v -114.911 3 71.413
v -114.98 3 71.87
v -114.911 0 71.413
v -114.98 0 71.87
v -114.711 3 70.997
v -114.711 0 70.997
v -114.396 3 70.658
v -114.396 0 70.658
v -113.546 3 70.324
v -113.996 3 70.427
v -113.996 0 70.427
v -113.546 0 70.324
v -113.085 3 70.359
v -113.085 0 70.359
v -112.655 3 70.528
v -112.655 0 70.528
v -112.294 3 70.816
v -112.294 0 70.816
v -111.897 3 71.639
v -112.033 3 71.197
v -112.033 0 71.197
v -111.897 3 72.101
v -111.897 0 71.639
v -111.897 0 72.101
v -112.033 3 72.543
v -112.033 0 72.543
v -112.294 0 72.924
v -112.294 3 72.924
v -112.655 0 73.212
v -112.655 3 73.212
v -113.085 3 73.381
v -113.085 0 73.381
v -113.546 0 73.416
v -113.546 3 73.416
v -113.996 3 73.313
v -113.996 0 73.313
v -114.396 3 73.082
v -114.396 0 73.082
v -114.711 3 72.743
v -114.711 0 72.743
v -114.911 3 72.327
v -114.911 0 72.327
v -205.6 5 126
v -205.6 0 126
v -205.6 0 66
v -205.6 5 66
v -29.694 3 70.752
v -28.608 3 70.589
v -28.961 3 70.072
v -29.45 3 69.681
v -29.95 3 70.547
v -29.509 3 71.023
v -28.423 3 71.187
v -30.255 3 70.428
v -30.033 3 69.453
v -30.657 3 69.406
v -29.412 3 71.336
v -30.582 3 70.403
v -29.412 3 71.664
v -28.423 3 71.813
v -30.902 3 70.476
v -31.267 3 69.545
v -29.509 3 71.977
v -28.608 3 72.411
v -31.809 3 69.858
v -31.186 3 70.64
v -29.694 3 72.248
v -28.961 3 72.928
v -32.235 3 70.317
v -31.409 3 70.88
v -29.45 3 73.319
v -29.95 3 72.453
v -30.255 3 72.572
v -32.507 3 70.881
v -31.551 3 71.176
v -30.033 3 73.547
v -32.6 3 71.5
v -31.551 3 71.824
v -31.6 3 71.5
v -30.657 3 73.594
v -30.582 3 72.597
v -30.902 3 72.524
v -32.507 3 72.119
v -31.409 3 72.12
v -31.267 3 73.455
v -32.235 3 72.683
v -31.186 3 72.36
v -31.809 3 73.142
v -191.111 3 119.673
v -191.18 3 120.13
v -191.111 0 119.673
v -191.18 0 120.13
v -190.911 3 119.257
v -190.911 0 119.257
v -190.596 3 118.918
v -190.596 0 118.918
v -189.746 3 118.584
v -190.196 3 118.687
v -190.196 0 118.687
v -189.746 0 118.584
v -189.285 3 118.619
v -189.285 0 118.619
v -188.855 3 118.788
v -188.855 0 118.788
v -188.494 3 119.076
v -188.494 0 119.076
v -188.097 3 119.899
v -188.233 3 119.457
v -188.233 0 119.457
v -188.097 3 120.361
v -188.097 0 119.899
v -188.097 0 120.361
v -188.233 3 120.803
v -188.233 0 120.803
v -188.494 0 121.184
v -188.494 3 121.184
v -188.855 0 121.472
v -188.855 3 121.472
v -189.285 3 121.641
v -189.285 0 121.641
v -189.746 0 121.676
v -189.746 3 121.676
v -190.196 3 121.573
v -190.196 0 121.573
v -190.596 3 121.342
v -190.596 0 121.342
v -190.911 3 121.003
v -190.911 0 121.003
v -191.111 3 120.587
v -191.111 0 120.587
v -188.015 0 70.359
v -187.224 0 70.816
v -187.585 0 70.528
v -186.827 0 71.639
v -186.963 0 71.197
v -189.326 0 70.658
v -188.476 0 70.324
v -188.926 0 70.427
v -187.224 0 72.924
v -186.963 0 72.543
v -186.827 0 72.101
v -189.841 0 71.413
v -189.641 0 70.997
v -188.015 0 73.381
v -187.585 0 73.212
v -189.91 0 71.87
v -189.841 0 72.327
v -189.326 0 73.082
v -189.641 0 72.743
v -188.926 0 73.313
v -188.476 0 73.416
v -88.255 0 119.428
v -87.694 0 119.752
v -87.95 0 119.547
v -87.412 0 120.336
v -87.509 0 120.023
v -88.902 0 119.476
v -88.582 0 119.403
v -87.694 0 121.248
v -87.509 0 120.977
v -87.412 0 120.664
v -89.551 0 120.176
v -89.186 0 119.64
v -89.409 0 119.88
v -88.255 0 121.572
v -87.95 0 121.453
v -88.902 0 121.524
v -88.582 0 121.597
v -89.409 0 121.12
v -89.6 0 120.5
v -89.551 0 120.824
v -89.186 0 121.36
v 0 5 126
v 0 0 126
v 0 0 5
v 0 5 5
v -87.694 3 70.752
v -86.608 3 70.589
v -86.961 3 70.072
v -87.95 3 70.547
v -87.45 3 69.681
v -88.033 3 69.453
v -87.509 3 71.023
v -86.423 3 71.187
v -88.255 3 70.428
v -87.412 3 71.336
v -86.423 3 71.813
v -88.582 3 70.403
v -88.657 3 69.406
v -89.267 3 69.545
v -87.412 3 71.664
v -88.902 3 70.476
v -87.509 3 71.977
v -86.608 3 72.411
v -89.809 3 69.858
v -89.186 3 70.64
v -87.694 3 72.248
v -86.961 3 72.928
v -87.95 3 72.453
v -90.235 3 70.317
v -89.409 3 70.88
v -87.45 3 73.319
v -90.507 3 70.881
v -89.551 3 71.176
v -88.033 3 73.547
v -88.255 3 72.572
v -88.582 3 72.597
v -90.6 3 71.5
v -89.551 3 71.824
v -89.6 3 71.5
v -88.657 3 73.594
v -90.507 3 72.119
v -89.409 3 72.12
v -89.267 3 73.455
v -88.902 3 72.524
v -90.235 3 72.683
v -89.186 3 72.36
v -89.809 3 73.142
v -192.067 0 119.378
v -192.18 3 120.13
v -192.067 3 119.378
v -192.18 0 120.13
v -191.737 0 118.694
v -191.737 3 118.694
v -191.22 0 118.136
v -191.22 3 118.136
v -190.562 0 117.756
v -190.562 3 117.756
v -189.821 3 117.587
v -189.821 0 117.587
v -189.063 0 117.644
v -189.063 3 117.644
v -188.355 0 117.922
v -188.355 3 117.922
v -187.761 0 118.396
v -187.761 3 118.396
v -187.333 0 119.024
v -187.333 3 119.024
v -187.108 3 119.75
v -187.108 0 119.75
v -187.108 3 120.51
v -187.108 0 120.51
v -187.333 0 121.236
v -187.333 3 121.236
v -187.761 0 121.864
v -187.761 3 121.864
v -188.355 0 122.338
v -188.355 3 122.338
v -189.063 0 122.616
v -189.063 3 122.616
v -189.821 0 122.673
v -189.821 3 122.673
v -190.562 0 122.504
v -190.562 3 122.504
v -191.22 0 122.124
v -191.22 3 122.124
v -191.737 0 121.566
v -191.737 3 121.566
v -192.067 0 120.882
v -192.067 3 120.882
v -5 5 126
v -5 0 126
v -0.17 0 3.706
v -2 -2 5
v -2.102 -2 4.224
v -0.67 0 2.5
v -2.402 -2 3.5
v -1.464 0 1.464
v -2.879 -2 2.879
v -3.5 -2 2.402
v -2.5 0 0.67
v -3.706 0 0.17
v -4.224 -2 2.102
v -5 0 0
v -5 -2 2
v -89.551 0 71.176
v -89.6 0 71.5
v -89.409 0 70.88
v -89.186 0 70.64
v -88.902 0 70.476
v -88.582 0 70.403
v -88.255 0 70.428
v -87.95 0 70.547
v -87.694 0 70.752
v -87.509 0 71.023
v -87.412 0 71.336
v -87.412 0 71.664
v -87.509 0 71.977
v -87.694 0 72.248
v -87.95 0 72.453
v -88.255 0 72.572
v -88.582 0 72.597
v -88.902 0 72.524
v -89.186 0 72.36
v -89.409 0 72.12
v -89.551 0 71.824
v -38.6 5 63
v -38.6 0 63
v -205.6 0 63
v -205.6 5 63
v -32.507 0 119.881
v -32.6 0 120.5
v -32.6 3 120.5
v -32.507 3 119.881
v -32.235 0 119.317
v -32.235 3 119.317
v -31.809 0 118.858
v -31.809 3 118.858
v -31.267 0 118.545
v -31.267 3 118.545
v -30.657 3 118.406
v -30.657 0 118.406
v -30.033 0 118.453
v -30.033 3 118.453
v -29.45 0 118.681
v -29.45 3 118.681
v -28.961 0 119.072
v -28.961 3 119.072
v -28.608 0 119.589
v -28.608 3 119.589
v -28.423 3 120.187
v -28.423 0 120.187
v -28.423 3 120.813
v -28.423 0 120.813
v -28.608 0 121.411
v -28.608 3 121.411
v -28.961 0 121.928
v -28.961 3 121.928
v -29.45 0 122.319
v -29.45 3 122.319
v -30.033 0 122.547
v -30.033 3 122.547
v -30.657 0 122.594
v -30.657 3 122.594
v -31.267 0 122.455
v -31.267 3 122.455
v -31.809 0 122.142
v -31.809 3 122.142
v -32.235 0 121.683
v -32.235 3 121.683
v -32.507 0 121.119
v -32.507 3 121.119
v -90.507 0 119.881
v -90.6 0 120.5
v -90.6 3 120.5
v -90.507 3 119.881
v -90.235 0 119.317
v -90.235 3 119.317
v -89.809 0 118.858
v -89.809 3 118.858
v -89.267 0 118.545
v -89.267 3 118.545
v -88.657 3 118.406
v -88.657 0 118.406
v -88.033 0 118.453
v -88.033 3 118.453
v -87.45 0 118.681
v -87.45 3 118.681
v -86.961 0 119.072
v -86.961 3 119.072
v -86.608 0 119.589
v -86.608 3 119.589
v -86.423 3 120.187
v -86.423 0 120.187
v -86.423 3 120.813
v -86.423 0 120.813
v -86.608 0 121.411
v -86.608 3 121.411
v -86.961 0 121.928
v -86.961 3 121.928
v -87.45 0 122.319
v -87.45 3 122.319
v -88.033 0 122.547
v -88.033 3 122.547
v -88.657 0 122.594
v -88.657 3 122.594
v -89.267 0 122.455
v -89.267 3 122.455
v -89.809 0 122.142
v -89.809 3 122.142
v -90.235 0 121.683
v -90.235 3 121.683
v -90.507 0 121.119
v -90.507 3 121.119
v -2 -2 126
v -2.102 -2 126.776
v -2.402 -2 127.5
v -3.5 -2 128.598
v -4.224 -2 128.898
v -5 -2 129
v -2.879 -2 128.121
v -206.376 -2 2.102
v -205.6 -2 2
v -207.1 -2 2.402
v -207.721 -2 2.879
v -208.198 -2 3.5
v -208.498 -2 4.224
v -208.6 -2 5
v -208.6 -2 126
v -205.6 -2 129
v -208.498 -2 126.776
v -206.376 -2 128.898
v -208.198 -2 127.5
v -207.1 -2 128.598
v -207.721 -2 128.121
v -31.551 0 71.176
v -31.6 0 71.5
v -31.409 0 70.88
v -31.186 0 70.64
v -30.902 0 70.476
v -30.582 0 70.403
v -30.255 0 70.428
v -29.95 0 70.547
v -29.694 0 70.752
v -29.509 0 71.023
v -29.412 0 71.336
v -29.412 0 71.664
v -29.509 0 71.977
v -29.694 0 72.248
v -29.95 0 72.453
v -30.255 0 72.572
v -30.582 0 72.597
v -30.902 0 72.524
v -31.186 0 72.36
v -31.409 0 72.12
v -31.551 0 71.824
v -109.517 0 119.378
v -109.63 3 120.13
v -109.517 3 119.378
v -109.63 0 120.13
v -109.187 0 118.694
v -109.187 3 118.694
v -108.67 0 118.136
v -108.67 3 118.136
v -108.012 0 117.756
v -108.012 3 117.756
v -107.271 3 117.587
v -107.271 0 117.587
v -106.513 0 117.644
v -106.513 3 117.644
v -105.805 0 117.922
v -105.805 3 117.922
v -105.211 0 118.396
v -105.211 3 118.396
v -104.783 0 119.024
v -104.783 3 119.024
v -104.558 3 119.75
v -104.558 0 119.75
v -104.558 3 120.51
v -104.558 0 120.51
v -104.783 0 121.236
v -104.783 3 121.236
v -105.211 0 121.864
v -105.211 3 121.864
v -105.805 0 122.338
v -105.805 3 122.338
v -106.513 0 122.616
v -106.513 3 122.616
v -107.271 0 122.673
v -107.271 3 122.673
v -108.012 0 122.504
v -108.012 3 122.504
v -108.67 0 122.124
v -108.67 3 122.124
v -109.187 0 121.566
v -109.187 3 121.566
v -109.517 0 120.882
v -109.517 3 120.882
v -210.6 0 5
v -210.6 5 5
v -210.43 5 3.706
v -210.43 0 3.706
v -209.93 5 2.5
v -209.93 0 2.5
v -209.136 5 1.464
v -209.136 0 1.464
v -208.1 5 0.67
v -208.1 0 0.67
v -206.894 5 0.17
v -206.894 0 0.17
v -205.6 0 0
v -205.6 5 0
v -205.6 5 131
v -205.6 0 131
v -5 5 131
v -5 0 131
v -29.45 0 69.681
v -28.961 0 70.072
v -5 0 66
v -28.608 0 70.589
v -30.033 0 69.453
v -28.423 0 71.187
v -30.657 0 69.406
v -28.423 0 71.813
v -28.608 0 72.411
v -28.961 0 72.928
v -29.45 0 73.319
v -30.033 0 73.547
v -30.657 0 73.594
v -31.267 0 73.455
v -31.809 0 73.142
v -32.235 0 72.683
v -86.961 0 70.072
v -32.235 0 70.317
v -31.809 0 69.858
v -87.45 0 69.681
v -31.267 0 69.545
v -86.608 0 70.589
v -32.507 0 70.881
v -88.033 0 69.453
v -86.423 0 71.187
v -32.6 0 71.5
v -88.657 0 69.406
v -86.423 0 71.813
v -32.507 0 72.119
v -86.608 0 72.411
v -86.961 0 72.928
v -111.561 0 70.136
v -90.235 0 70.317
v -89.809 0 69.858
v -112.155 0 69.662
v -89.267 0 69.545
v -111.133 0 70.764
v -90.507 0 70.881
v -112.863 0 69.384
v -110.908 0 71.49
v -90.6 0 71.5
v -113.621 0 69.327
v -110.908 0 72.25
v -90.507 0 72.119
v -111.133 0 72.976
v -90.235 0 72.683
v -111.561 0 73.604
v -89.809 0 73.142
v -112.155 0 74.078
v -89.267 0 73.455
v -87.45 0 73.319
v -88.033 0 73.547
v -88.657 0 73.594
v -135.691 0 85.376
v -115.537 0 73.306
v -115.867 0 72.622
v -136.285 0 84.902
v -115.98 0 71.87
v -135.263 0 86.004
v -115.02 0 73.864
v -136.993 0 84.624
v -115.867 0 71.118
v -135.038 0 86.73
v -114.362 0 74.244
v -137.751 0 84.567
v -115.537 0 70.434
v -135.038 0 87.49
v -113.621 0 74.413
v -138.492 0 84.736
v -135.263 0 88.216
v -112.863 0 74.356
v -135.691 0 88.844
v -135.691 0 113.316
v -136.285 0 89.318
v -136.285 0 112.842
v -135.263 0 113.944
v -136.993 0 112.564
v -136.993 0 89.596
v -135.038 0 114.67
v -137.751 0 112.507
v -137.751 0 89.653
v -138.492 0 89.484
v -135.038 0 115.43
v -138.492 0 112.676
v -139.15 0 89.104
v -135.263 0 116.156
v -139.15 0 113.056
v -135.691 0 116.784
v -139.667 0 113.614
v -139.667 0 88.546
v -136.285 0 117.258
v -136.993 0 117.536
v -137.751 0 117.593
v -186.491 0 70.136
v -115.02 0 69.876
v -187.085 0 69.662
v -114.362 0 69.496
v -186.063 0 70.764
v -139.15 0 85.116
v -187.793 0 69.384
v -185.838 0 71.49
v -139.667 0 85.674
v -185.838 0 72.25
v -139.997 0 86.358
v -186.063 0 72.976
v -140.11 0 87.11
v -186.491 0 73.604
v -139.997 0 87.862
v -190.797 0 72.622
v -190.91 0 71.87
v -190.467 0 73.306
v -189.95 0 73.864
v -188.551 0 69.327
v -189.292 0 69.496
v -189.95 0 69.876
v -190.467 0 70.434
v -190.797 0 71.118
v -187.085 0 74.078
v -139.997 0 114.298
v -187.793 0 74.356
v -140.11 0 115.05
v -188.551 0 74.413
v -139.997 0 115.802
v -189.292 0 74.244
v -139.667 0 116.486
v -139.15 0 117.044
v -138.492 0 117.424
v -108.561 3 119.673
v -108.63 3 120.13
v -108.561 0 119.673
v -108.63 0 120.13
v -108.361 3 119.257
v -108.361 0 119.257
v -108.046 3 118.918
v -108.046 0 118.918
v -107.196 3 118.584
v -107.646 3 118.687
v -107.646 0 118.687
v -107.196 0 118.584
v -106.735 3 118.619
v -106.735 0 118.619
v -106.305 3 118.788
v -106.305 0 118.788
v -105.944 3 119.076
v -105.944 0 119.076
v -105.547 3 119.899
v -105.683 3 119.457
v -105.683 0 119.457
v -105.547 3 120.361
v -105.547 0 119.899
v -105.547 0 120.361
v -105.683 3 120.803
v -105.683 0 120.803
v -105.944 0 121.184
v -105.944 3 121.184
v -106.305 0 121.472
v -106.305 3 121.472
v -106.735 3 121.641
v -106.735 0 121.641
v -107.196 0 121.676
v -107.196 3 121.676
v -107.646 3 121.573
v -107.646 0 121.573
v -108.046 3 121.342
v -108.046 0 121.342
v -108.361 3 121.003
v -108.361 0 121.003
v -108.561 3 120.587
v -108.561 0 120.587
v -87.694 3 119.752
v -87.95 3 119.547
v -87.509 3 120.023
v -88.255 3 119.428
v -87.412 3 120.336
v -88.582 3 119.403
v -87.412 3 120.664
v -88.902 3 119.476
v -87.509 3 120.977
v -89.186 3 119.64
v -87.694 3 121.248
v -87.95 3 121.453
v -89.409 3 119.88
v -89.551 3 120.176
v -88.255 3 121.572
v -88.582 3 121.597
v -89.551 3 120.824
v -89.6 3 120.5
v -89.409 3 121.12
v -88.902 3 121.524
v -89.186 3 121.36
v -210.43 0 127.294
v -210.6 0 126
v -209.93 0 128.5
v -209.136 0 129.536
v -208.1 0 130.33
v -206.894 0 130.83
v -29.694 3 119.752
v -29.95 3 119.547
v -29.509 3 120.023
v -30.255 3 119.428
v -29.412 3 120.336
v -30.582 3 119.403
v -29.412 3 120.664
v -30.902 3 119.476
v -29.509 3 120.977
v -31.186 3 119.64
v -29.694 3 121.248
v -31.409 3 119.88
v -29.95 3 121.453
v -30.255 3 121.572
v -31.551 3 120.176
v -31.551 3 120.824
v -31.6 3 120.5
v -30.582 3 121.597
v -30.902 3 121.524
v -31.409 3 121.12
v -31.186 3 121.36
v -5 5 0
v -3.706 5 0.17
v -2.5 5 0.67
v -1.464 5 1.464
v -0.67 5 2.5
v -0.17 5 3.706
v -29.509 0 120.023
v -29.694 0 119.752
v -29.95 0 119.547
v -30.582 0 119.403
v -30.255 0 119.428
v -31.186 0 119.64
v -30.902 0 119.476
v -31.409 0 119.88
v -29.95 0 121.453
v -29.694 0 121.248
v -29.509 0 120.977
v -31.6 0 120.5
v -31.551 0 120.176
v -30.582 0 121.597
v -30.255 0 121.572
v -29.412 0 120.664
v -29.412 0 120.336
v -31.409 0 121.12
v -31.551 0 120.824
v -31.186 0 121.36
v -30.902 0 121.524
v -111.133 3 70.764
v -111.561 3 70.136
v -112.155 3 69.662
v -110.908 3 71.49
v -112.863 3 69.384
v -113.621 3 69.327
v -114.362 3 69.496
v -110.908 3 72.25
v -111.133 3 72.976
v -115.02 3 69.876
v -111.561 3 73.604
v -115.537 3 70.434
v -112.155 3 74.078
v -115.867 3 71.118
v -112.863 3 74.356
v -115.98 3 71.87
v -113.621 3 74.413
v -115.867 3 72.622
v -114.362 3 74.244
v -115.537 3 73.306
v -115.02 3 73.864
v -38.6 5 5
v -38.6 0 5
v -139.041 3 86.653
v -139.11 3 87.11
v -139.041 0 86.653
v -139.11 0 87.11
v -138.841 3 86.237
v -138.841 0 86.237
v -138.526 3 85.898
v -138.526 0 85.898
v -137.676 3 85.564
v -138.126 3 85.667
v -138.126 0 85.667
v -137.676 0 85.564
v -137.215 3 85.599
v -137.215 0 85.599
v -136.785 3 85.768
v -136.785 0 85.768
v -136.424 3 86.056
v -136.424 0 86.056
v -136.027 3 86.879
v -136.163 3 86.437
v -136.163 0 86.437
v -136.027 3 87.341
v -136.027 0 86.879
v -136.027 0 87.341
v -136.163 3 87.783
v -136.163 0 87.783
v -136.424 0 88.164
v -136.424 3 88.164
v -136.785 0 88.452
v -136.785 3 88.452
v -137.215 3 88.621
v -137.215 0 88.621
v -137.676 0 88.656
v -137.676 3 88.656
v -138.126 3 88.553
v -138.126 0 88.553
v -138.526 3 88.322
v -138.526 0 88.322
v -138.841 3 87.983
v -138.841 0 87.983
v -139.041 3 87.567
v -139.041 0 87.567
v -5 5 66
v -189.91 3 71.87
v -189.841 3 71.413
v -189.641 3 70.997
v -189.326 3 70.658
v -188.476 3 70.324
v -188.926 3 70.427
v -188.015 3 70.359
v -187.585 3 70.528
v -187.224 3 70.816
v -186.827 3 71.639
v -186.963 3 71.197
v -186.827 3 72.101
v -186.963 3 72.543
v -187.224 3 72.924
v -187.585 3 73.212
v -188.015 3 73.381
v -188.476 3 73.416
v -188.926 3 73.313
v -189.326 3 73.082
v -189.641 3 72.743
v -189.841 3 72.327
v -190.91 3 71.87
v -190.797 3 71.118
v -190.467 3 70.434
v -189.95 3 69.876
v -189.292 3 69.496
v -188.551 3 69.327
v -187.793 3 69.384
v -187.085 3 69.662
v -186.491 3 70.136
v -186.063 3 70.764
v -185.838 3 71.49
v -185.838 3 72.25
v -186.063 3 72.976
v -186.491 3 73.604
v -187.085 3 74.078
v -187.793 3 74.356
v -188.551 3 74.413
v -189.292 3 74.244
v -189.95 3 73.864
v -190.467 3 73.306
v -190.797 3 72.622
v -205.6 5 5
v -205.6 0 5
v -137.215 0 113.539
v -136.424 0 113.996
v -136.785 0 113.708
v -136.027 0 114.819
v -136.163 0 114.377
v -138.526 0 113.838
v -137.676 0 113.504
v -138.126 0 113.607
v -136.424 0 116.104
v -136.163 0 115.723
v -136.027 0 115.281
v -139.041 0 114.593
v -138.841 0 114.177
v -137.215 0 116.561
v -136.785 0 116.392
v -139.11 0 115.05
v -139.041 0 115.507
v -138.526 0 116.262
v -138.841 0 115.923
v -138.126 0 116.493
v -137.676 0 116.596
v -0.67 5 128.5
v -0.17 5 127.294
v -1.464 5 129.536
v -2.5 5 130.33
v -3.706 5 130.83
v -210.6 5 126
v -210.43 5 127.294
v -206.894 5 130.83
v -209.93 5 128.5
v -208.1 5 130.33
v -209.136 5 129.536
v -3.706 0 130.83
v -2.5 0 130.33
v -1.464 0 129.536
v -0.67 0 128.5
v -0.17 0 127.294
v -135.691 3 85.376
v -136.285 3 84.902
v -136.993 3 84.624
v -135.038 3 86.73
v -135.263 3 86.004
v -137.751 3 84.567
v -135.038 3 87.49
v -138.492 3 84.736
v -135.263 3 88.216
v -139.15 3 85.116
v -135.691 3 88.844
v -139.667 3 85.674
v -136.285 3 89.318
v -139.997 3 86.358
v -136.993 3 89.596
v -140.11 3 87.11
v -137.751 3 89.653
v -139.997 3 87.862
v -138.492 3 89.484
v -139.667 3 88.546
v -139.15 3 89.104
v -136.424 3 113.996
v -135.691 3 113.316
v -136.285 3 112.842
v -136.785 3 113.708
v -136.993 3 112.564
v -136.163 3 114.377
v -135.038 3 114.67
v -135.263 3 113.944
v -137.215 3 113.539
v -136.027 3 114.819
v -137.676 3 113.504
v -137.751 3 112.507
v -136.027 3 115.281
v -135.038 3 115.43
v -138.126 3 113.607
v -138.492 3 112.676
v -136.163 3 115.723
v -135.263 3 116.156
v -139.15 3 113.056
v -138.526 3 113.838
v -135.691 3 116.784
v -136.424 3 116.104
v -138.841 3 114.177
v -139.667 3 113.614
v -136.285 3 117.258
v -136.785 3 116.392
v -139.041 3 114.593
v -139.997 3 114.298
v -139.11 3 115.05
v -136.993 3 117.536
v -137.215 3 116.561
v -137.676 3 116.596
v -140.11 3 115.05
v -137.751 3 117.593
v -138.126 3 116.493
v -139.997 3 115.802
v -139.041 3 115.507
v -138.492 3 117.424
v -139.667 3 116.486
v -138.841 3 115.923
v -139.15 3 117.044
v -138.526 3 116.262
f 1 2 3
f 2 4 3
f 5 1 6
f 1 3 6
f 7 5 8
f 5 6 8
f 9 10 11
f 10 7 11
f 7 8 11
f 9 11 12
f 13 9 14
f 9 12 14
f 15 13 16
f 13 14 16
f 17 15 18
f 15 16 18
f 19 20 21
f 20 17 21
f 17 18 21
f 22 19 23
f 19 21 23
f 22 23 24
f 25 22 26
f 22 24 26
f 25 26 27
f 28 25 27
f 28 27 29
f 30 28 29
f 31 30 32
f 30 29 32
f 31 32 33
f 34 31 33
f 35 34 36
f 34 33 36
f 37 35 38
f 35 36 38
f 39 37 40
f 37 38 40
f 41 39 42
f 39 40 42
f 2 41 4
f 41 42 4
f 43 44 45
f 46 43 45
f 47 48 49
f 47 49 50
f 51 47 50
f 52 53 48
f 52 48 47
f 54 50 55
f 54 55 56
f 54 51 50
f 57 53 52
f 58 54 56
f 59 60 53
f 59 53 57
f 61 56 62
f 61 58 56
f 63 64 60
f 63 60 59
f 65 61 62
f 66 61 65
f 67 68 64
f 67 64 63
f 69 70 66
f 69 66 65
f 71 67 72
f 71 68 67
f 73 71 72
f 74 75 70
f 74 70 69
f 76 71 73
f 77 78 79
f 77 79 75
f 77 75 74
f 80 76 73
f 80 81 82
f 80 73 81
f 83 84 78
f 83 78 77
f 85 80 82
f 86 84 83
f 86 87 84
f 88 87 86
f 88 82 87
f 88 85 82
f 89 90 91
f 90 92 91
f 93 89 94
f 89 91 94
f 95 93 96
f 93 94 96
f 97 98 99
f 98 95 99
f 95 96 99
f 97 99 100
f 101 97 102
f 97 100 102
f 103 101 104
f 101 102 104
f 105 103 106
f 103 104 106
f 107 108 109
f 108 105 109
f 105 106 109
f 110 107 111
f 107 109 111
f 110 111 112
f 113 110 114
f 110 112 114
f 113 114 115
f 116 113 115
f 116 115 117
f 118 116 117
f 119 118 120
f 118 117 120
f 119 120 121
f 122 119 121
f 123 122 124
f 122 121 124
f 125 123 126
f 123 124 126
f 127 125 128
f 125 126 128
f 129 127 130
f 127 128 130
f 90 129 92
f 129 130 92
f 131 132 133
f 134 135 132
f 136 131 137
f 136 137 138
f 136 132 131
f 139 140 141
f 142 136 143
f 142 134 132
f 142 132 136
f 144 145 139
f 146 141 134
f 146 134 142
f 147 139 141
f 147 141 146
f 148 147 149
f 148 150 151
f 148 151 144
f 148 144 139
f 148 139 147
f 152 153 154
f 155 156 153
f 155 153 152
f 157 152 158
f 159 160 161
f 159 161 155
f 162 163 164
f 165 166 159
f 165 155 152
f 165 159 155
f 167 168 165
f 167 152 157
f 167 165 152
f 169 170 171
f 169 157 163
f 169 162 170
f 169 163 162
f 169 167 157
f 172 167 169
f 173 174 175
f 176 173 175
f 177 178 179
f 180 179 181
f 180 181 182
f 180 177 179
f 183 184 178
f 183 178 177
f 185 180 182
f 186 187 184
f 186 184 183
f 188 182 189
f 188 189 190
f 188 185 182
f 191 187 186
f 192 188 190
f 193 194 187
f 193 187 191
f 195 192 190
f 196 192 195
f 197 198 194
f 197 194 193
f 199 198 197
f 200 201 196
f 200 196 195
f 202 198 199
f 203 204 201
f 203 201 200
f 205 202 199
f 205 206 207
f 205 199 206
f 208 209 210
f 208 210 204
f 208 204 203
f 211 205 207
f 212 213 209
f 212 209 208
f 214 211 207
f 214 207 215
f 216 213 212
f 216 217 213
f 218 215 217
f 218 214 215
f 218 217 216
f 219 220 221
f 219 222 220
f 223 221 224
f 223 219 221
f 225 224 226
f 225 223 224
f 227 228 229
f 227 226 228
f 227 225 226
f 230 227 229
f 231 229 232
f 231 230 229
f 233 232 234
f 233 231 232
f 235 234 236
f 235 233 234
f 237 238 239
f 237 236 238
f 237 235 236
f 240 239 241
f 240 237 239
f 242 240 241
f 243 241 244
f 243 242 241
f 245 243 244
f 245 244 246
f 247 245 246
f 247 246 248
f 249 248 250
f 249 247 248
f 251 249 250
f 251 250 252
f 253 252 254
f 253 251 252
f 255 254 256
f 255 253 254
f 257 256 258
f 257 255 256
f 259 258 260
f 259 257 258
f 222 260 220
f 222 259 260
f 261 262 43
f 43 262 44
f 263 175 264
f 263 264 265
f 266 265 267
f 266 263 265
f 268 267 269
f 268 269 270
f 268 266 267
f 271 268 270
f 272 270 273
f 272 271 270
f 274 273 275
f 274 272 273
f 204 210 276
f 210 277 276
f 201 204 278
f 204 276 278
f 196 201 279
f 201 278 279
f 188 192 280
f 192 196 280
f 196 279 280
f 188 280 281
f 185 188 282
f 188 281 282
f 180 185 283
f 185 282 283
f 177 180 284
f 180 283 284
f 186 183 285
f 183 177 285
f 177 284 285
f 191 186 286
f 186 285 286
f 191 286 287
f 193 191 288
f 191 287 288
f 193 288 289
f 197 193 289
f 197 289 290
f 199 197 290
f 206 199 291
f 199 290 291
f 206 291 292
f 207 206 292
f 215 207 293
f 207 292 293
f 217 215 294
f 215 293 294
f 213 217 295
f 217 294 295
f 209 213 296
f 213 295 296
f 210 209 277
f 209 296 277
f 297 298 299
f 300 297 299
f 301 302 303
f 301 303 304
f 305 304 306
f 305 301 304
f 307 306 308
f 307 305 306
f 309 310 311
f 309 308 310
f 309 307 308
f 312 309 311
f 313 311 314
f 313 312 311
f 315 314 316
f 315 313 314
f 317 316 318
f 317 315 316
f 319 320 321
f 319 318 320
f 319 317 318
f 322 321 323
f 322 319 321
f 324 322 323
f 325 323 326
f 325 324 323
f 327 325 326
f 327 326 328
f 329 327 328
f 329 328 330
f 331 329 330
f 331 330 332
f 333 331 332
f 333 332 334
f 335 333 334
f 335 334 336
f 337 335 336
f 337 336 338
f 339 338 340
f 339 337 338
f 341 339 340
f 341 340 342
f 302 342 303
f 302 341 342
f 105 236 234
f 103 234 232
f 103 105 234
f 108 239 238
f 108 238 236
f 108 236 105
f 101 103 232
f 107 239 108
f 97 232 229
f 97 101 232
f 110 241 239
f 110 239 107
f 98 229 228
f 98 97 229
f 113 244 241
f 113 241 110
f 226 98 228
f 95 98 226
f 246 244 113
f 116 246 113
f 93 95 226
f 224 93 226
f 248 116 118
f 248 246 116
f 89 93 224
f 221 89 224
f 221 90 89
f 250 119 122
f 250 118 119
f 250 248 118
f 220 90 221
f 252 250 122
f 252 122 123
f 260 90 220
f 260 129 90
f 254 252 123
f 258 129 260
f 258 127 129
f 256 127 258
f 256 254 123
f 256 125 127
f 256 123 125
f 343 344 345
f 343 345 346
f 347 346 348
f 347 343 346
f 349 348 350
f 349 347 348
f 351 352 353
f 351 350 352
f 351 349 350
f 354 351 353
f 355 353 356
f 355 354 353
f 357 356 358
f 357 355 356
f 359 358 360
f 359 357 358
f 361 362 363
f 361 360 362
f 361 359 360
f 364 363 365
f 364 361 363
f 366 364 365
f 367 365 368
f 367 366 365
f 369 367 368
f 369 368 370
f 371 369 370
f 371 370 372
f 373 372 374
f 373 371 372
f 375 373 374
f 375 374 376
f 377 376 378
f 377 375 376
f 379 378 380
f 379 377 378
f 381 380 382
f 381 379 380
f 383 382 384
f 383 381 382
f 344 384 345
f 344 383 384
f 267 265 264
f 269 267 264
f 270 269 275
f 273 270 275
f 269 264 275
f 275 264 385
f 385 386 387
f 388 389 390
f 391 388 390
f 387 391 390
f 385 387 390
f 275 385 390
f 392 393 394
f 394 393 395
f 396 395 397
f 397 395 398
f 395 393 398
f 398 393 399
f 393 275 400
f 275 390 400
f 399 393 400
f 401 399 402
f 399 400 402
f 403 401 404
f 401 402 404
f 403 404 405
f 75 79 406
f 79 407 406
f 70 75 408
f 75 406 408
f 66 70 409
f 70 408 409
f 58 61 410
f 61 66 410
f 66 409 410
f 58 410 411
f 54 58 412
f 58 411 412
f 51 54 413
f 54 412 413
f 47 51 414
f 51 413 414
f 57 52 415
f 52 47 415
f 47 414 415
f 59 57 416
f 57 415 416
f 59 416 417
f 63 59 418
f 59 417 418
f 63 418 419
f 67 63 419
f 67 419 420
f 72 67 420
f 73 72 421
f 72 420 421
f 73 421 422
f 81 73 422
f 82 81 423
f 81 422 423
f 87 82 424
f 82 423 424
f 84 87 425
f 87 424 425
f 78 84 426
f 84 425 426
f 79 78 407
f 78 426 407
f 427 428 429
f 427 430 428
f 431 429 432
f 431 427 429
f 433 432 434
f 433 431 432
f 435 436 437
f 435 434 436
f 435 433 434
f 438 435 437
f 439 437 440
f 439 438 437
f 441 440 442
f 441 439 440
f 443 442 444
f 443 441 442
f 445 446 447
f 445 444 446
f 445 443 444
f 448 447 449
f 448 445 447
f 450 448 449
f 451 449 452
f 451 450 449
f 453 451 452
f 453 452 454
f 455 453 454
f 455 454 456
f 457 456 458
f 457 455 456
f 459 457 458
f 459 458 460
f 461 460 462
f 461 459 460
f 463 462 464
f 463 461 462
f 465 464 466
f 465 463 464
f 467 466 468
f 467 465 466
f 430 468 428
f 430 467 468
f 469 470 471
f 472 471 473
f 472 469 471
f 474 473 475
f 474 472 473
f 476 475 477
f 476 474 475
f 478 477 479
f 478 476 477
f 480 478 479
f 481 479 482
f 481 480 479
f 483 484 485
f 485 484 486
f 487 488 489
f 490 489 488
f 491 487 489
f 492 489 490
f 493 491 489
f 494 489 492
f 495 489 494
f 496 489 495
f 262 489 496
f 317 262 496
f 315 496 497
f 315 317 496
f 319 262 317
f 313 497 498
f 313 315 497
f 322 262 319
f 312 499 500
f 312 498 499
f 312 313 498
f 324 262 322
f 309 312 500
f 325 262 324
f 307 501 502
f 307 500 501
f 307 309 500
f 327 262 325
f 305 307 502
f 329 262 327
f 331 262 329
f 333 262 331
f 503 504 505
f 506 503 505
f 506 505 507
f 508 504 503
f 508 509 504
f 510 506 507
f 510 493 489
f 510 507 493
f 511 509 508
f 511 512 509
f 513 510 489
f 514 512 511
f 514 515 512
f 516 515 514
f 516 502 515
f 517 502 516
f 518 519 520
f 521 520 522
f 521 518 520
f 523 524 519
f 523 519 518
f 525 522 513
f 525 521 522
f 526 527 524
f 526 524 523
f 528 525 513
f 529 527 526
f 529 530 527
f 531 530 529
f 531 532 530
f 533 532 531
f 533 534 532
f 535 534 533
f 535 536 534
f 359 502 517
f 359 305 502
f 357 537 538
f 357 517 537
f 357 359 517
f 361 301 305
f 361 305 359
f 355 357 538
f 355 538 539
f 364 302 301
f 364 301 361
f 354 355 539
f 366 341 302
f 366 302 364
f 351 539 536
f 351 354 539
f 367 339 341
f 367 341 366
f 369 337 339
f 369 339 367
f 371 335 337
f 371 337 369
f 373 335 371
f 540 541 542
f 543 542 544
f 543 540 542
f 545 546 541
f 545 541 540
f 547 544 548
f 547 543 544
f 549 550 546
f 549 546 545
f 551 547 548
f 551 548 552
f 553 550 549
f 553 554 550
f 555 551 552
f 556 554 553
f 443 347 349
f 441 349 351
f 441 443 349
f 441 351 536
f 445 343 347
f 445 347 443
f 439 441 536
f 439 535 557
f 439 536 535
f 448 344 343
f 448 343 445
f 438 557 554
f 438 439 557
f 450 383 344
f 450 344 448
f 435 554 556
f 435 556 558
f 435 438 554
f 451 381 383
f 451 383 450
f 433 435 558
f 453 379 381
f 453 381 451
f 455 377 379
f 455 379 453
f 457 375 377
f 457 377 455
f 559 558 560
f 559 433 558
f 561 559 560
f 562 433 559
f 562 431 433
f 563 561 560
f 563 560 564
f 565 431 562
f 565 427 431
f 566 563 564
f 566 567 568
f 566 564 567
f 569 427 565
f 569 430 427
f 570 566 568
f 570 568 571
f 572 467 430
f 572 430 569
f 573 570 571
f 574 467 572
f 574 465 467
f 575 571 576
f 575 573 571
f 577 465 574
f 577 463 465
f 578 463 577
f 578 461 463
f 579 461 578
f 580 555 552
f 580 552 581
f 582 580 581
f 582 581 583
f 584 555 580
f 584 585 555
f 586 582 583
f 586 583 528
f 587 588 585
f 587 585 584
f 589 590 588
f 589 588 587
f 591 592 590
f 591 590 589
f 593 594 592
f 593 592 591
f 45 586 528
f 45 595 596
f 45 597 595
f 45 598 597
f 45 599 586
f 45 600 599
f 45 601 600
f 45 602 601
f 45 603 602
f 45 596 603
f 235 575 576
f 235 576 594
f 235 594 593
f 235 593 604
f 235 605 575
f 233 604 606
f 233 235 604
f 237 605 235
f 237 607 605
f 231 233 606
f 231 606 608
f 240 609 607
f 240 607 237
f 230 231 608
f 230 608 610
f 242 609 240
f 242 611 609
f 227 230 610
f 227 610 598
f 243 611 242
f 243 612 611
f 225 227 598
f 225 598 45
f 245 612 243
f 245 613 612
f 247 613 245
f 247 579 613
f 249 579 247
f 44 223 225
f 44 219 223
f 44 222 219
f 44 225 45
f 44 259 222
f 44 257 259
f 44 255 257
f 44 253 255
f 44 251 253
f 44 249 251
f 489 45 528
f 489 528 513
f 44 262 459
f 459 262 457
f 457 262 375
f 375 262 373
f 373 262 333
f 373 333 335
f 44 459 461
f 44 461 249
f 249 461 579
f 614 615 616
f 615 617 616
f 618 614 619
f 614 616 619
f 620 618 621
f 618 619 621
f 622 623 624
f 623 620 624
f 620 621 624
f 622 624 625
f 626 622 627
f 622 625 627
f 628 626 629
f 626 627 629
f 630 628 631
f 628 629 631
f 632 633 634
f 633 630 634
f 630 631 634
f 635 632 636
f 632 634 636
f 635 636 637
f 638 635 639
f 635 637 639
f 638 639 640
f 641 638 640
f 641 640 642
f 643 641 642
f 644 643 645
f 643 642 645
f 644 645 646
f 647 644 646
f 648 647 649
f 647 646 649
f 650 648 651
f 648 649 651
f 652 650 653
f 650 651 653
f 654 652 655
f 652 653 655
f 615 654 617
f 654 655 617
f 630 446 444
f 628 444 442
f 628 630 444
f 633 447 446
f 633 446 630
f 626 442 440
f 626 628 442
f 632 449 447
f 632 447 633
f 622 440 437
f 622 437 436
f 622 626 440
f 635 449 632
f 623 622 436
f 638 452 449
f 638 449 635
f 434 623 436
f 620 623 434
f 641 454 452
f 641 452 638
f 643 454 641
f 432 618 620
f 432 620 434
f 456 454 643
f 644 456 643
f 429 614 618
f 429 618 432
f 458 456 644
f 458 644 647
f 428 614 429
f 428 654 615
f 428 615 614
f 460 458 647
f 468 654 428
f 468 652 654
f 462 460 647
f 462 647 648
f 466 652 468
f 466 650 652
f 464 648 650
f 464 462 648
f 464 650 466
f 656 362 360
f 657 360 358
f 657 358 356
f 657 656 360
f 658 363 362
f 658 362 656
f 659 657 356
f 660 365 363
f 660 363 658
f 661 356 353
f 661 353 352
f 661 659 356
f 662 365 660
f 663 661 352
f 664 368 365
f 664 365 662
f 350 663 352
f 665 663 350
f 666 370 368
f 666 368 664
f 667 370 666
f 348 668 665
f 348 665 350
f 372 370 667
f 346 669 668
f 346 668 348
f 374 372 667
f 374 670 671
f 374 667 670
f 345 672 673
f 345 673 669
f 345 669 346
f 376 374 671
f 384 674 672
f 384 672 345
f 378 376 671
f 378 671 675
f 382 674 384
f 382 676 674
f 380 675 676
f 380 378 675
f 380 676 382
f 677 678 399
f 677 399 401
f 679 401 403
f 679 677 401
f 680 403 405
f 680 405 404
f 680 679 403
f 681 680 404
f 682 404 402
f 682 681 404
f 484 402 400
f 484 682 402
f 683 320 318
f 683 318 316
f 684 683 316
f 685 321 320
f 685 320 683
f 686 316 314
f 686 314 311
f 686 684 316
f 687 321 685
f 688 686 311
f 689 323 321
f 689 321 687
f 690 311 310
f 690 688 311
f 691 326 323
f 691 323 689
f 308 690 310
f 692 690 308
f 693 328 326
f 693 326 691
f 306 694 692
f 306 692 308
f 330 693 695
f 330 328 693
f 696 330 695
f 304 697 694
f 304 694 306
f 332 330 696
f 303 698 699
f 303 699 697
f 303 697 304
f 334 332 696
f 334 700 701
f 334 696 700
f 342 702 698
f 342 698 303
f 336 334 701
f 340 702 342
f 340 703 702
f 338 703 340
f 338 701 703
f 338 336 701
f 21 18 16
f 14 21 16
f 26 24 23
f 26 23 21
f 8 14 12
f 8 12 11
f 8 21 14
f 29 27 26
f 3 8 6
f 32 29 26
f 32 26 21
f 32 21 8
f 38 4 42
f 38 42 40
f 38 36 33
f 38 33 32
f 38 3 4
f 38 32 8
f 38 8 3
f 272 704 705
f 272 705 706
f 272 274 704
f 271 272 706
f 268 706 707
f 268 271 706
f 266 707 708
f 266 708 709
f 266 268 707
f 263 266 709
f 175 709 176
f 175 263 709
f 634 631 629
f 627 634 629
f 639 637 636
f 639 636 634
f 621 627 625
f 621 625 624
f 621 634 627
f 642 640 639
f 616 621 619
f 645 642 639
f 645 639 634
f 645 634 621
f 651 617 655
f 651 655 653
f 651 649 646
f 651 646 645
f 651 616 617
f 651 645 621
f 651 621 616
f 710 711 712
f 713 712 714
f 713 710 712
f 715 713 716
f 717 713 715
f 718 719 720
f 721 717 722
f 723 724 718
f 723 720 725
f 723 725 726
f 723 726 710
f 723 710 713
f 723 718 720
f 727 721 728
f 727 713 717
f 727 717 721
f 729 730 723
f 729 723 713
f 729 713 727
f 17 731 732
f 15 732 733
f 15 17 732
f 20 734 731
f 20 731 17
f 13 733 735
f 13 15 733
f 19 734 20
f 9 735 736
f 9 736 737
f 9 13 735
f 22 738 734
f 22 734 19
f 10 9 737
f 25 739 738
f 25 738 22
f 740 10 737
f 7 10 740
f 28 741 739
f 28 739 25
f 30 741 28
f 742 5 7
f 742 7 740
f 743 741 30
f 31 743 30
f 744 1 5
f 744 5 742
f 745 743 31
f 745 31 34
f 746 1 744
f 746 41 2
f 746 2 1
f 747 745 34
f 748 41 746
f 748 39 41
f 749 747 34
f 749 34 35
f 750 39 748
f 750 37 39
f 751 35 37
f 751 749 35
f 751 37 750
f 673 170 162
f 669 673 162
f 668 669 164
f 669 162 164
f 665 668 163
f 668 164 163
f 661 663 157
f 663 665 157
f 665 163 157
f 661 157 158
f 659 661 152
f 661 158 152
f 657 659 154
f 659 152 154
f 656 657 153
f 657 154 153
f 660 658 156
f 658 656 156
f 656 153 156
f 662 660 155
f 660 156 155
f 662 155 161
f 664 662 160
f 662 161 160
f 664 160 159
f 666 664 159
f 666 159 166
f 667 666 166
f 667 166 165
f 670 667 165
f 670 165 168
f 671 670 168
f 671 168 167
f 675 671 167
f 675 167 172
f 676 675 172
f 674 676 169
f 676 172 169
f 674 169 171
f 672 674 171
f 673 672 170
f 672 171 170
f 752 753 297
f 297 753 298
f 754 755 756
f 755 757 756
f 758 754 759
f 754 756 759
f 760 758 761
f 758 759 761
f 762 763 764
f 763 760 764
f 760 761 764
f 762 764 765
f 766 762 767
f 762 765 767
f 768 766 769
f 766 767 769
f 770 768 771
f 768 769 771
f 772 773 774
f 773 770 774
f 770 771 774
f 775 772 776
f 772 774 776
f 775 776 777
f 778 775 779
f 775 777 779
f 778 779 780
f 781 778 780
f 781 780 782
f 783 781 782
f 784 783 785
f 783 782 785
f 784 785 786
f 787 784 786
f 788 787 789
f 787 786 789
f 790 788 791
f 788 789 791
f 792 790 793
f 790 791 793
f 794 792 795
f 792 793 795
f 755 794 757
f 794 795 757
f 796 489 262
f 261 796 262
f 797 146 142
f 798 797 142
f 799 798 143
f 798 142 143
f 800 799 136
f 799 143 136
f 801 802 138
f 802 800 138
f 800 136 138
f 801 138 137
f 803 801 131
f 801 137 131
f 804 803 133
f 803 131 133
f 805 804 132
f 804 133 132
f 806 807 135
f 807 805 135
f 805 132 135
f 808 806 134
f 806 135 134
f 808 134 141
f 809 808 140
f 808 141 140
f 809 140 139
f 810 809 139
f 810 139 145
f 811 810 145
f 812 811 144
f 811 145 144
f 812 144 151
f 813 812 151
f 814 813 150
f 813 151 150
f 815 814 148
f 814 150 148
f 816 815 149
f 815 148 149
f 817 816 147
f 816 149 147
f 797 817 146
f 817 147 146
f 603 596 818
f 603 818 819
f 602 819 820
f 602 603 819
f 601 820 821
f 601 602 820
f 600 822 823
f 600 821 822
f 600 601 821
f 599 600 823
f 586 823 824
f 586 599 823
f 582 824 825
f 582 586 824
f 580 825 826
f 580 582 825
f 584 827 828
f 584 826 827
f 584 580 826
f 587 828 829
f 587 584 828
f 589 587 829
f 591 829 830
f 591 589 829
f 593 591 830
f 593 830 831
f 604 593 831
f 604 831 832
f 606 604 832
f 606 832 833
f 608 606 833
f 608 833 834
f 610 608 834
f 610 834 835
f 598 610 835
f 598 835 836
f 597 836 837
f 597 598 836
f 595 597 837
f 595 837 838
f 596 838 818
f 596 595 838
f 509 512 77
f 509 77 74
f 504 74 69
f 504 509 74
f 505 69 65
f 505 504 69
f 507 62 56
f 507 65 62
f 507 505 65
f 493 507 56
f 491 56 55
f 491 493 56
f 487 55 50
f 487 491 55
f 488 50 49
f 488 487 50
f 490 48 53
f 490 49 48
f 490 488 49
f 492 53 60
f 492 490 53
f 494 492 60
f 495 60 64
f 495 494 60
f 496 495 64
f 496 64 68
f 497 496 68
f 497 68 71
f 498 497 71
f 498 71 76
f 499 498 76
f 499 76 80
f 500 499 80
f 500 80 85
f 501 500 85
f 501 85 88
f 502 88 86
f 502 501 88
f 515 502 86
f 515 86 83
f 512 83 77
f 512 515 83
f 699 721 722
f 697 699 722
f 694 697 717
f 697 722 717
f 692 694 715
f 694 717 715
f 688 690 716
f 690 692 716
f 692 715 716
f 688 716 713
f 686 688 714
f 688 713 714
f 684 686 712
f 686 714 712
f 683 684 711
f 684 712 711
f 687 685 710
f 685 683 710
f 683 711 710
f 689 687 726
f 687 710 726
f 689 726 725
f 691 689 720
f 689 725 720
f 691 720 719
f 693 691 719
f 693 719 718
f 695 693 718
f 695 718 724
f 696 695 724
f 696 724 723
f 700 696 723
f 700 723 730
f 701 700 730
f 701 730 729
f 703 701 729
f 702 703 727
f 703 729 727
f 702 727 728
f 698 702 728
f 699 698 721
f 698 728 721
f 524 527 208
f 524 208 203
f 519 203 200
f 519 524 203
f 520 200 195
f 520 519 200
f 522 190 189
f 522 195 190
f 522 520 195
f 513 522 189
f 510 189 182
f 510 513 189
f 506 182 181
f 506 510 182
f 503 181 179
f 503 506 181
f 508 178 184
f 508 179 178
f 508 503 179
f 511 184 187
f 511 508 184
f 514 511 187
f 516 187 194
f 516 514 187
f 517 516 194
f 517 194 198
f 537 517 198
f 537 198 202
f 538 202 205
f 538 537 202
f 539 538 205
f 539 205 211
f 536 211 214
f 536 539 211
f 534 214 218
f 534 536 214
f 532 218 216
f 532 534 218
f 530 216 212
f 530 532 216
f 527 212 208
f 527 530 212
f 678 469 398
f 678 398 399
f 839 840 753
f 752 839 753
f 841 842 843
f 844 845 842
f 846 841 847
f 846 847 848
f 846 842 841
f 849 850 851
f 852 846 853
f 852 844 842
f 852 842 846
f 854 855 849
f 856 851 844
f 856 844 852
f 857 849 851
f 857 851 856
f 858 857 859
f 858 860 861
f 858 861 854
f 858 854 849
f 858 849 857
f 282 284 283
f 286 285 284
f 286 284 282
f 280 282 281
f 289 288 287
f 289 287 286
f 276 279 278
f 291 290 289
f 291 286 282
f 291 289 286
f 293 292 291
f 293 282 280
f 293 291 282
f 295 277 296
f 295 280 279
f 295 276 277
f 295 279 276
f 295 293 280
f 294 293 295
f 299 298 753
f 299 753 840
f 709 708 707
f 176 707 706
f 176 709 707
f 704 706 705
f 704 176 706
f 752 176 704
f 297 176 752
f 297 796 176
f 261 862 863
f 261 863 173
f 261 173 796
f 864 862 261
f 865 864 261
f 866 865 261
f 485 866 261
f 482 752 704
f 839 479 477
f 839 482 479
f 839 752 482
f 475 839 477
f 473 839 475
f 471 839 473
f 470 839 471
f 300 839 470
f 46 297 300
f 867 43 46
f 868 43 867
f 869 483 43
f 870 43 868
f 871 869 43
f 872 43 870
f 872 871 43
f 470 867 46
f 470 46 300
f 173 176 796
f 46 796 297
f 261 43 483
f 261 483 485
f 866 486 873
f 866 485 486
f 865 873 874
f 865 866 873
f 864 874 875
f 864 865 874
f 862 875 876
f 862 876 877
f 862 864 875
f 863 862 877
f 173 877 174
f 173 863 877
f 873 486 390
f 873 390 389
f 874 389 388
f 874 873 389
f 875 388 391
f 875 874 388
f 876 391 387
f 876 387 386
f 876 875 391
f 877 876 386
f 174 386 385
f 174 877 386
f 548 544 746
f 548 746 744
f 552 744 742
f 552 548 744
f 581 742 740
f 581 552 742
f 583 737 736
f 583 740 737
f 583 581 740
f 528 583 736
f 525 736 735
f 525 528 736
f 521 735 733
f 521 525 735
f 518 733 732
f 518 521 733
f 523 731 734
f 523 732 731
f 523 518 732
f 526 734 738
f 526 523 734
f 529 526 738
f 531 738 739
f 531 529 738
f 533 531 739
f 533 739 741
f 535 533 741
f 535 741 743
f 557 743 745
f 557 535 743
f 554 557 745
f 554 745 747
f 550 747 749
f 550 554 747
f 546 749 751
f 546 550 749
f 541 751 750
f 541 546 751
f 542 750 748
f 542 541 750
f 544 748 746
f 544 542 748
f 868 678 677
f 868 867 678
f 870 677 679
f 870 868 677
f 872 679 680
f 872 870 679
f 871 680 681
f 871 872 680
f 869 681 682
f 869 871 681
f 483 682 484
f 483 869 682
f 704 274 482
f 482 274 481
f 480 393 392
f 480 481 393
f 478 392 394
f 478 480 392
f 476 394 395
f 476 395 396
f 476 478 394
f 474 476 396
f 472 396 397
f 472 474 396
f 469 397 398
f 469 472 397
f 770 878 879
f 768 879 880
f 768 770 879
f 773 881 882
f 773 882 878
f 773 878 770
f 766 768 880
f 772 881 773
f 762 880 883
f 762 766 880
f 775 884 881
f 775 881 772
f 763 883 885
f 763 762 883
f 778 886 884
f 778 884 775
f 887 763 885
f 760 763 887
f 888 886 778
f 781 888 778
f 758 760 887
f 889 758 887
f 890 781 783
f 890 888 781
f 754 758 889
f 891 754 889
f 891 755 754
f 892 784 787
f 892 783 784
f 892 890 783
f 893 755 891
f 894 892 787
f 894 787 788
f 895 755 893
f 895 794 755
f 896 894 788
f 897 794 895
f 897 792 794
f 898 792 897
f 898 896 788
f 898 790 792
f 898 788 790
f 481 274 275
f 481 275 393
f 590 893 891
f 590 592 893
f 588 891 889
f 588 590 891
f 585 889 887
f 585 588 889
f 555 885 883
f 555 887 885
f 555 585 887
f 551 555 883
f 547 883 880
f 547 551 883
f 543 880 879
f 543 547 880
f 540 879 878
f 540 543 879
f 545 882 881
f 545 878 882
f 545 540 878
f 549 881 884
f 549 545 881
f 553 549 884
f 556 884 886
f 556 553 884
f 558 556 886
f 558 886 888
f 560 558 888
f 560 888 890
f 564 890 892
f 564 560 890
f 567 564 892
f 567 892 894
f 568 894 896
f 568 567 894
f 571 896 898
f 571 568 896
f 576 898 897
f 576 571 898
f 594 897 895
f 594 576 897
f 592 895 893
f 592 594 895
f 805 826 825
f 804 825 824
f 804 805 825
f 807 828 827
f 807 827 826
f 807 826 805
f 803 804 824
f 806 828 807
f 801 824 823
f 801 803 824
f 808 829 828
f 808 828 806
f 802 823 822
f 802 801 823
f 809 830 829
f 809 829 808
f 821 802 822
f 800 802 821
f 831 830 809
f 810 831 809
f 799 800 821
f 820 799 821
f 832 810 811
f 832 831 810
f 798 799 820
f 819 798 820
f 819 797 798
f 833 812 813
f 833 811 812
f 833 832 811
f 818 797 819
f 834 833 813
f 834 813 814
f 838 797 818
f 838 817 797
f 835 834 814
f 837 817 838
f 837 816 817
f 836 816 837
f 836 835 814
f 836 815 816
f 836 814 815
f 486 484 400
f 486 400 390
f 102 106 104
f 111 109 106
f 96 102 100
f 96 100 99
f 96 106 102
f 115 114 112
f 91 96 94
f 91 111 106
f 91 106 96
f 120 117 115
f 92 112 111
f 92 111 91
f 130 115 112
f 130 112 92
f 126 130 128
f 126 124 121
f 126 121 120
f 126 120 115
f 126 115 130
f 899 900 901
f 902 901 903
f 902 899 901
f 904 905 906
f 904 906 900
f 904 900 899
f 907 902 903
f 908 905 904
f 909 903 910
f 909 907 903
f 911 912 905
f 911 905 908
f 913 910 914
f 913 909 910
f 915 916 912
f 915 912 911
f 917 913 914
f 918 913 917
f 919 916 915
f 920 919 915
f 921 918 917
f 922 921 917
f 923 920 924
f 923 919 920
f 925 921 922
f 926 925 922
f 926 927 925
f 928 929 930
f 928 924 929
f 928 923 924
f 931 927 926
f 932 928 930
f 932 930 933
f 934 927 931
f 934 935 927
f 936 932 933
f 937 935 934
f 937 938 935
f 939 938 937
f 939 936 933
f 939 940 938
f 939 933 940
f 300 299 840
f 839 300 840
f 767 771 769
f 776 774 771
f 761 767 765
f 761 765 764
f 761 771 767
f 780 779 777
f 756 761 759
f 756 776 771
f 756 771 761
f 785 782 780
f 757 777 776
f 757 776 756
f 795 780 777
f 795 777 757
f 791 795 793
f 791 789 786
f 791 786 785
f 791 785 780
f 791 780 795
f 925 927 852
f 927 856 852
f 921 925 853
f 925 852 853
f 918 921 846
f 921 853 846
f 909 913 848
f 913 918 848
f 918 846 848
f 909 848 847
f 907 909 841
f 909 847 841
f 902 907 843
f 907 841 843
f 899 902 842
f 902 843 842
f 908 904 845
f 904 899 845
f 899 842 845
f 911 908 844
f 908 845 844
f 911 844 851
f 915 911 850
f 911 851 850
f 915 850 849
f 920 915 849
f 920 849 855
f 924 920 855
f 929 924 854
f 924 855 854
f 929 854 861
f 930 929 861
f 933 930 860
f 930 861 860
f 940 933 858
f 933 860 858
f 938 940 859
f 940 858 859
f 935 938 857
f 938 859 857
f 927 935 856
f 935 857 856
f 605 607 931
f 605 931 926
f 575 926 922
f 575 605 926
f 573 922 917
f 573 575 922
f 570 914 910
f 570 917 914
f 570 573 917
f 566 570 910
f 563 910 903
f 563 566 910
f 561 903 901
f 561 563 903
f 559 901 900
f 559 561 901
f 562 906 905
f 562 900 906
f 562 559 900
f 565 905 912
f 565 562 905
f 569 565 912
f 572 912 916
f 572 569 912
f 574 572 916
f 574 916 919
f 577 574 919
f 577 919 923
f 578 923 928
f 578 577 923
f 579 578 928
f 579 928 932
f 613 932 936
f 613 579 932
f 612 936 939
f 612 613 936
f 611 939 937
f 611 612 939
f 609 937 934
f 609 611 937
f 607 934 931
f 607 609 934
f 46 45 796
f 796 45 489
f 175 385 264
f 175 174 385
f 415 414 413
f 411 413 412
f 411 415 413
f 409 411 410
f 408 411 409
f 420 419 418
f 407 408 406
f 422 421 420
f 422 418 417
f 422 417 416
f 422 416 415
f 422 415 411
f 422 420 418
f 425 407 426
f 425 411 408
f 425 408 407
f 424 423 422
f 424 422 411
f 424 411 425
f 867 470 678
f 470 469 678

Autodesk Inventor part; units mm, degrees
ref_plane "YZ Plane" through (0, 0, 0) normal (1, 0, 0) x (0, 1, 0)
ref_plane "XZ Plane" through (0, 0, 0) normal (0, 1, 0) x (-1, 0, 0)
ref_plane "XY Plane" through (0, 0, 0) normal (0, 0, 1) x (1, 0, 0)
sketch "Sketch1" plane through (0, 0, 0) normal (0, 1, 0) x (-1, 0, 0)
  line L0 (210.6, 131) -> (0, 131)
  line L1 (0, 131) -> (0, 0)
  line L2 (0, 0) -> (210.6, 0)
  line L3 (210.6, 0) -> (210.6, 131)
  line L4 (92, 68) -> (7, 68) construction
  line L5 (7, 68) -> (7, 124) construction
  line L6 (7, 124) -> (92, 124) construction
  line L7 (92, 124) -> (92, 68) construction
  circle A0 centre (88.5, 71.5) radius 1.1
  circle A1 centre (88.5, 120.5) radius 1.1
  circle A2 centre (30.5, 71.5) radius 1.1
  circle A3 centre (30.5, 120.5) radius 1.1
  line L8 (0, 0) -> (-136.9444, 0) construction
  line L9 (0, 0) -> (0, -49.9102) construction
  circle A4 centre (88.5, 71.5) radius 2.1
  circle A5 centre (88.5, 120.5) radius 2.1
  circle A6 centre (30.5, 71.5) radius 2.1
  circle A7 centre (30.5, 120.5) radius 2.1
  line L10 (205.6, 66) -> (5, 66)
  line L11 (5, 66) -> (5, 126)
  line L12 (5, 126) -> (205.6, 126)
  line L13 (205.6, 126) -> (205.6, 66)
  line L14 (203.6, 69.33) -> (102, 69.33) construction
  line L15 (102, 69.33) -> (102, 122.67) construction
  line L16 (102, 122.67) -> (203.6, 122.67) construction
  line L17 (203.6, 122.67) -> (203.6, 69.33) construction
  line L18 (205.6, 5) -> (38.6, 5)
  line L19 (38.6, 5) -> (38.6, 63)
  line L20 (38.6, 63) -> (205.6, 63)
  line L21 (205.6, 63) -> (205.6, 5)
  circle A8 centre (188.36, 71.87) radius 2.55
  circle A9 centre (188.36, 71.87) radius 1.55
  circle A10 centre (113.43, 71.87) radius 2.55
  circle A11 centre (113.43, 71.87) radius 1.55
  circle A12 centre (189.63, 120.13) radius 1.55
  circle A13 centre (107.08, 120.13) radius 2.55
  circle A14 centre (189.63, 120.13) radius 2.55
  circle A15 centre (107.08, 120.13) radius 1.55
  circle A16 centre (137.56, 115.05) radius 2.55
  circle A17 centre (137.56, 115.05) radius 1.55
  circle A18 centre (137.56, 87.11) radius 2.55
  circle A19 centre (137.56, 87.11) radius 1.55
  point P0 (92, 96)
  point P1 (102, 96)
  point P2 (1.5544, 63)
  point P3 (2.0056, 63)
  point P4 (82.8344, 63)
  point P5 (83.2856, 63)
  dimension "d8" = 85
  dimension "d9" = 56
  dimension "d10" = 2.2
  dimension "d11" = 3.5
  dimension "d12" = 3.5
  dimension "d13" = 3.5
  dimension "d33" = 1
  dimension "d34" = 1
  dimension "d35" = 1
  dimension "d36" = 1
  dimension "d44" = 58
  dimension "d48" = 53.34
  dimension "d49" = 101.6
  dimension "d50" = 167
  dimension "d51" = 58
  dimension "d52" = 5
  dimension "d55" = 2
  dimension "d56" = 2
  dimension "d57" = 2
  dimension "d58" = 10
  dimension "d59" = 5
  dimension "d60" = 15.24
  dimension "d61" = 2.54
  dimension "d62" = 3.1
  dimension "d63" = 1
  dimension "d64" = 90.17
  dimension "d65" = 13.97
  dimension "d66" = 96.52
  dimension "d68" = 66.04
  dimension "d70" = 45.72
  dimension "d71" = 17.78
  dimension "d73" = 5
  dimension "d74" = 50.8
  dimension "d76" = 3
  dimension "d77" = 2
  dimension "d78" = 5
extrude "Extrusion1" add sketch "Sketch1" against normal blind 2 contours L3 L2 L1 L0 | A0 | A1 | A2 | A3 | A4 | A5 | A6 | A7 | L10 L11 L12 L13 | L18 L19 L20 L21 | A8 | A9 | A10 | A11 | A12 | A13 | A14 | A15 | A16 | A17 | A18 | A19
extrude "Extrusion2" add sketch "Sketch1" along normal blind 5 contours L3 L2 L1 L0
extrude "Extrusion3" add sketch "Sketch1" along normal blind 3 contours A4 | A5 | A6 | A7 | A8 | A10 | A13 | A14 | A16 | A18
fillet "Fillet1" radius 5 4 edges at (-210.6, 1.5, 0) (0, 1.5, 131) (-210.6, 1.5, 131) (0, 1.5, 0)
chamfer "Chamfer1" distance 2 angle 45 8 edges at (-105.3, -2, 131) (-209.1355, -2, 129.5355) (-210.6, -2, 65.5) (-209.1355, -2, 1.4645) (-105.3, -2, 0) (-1.4645, -2, 1.4645) (0, -2, 65.5) (-1.4645, -2, 129.5355)
equation "\"d12\" = d11"
equation "\"d13\" = d11"
equation "\"board_border\" = 2"
equation "\"base_wall\" = 5"
properties part number "Electronic Base"
